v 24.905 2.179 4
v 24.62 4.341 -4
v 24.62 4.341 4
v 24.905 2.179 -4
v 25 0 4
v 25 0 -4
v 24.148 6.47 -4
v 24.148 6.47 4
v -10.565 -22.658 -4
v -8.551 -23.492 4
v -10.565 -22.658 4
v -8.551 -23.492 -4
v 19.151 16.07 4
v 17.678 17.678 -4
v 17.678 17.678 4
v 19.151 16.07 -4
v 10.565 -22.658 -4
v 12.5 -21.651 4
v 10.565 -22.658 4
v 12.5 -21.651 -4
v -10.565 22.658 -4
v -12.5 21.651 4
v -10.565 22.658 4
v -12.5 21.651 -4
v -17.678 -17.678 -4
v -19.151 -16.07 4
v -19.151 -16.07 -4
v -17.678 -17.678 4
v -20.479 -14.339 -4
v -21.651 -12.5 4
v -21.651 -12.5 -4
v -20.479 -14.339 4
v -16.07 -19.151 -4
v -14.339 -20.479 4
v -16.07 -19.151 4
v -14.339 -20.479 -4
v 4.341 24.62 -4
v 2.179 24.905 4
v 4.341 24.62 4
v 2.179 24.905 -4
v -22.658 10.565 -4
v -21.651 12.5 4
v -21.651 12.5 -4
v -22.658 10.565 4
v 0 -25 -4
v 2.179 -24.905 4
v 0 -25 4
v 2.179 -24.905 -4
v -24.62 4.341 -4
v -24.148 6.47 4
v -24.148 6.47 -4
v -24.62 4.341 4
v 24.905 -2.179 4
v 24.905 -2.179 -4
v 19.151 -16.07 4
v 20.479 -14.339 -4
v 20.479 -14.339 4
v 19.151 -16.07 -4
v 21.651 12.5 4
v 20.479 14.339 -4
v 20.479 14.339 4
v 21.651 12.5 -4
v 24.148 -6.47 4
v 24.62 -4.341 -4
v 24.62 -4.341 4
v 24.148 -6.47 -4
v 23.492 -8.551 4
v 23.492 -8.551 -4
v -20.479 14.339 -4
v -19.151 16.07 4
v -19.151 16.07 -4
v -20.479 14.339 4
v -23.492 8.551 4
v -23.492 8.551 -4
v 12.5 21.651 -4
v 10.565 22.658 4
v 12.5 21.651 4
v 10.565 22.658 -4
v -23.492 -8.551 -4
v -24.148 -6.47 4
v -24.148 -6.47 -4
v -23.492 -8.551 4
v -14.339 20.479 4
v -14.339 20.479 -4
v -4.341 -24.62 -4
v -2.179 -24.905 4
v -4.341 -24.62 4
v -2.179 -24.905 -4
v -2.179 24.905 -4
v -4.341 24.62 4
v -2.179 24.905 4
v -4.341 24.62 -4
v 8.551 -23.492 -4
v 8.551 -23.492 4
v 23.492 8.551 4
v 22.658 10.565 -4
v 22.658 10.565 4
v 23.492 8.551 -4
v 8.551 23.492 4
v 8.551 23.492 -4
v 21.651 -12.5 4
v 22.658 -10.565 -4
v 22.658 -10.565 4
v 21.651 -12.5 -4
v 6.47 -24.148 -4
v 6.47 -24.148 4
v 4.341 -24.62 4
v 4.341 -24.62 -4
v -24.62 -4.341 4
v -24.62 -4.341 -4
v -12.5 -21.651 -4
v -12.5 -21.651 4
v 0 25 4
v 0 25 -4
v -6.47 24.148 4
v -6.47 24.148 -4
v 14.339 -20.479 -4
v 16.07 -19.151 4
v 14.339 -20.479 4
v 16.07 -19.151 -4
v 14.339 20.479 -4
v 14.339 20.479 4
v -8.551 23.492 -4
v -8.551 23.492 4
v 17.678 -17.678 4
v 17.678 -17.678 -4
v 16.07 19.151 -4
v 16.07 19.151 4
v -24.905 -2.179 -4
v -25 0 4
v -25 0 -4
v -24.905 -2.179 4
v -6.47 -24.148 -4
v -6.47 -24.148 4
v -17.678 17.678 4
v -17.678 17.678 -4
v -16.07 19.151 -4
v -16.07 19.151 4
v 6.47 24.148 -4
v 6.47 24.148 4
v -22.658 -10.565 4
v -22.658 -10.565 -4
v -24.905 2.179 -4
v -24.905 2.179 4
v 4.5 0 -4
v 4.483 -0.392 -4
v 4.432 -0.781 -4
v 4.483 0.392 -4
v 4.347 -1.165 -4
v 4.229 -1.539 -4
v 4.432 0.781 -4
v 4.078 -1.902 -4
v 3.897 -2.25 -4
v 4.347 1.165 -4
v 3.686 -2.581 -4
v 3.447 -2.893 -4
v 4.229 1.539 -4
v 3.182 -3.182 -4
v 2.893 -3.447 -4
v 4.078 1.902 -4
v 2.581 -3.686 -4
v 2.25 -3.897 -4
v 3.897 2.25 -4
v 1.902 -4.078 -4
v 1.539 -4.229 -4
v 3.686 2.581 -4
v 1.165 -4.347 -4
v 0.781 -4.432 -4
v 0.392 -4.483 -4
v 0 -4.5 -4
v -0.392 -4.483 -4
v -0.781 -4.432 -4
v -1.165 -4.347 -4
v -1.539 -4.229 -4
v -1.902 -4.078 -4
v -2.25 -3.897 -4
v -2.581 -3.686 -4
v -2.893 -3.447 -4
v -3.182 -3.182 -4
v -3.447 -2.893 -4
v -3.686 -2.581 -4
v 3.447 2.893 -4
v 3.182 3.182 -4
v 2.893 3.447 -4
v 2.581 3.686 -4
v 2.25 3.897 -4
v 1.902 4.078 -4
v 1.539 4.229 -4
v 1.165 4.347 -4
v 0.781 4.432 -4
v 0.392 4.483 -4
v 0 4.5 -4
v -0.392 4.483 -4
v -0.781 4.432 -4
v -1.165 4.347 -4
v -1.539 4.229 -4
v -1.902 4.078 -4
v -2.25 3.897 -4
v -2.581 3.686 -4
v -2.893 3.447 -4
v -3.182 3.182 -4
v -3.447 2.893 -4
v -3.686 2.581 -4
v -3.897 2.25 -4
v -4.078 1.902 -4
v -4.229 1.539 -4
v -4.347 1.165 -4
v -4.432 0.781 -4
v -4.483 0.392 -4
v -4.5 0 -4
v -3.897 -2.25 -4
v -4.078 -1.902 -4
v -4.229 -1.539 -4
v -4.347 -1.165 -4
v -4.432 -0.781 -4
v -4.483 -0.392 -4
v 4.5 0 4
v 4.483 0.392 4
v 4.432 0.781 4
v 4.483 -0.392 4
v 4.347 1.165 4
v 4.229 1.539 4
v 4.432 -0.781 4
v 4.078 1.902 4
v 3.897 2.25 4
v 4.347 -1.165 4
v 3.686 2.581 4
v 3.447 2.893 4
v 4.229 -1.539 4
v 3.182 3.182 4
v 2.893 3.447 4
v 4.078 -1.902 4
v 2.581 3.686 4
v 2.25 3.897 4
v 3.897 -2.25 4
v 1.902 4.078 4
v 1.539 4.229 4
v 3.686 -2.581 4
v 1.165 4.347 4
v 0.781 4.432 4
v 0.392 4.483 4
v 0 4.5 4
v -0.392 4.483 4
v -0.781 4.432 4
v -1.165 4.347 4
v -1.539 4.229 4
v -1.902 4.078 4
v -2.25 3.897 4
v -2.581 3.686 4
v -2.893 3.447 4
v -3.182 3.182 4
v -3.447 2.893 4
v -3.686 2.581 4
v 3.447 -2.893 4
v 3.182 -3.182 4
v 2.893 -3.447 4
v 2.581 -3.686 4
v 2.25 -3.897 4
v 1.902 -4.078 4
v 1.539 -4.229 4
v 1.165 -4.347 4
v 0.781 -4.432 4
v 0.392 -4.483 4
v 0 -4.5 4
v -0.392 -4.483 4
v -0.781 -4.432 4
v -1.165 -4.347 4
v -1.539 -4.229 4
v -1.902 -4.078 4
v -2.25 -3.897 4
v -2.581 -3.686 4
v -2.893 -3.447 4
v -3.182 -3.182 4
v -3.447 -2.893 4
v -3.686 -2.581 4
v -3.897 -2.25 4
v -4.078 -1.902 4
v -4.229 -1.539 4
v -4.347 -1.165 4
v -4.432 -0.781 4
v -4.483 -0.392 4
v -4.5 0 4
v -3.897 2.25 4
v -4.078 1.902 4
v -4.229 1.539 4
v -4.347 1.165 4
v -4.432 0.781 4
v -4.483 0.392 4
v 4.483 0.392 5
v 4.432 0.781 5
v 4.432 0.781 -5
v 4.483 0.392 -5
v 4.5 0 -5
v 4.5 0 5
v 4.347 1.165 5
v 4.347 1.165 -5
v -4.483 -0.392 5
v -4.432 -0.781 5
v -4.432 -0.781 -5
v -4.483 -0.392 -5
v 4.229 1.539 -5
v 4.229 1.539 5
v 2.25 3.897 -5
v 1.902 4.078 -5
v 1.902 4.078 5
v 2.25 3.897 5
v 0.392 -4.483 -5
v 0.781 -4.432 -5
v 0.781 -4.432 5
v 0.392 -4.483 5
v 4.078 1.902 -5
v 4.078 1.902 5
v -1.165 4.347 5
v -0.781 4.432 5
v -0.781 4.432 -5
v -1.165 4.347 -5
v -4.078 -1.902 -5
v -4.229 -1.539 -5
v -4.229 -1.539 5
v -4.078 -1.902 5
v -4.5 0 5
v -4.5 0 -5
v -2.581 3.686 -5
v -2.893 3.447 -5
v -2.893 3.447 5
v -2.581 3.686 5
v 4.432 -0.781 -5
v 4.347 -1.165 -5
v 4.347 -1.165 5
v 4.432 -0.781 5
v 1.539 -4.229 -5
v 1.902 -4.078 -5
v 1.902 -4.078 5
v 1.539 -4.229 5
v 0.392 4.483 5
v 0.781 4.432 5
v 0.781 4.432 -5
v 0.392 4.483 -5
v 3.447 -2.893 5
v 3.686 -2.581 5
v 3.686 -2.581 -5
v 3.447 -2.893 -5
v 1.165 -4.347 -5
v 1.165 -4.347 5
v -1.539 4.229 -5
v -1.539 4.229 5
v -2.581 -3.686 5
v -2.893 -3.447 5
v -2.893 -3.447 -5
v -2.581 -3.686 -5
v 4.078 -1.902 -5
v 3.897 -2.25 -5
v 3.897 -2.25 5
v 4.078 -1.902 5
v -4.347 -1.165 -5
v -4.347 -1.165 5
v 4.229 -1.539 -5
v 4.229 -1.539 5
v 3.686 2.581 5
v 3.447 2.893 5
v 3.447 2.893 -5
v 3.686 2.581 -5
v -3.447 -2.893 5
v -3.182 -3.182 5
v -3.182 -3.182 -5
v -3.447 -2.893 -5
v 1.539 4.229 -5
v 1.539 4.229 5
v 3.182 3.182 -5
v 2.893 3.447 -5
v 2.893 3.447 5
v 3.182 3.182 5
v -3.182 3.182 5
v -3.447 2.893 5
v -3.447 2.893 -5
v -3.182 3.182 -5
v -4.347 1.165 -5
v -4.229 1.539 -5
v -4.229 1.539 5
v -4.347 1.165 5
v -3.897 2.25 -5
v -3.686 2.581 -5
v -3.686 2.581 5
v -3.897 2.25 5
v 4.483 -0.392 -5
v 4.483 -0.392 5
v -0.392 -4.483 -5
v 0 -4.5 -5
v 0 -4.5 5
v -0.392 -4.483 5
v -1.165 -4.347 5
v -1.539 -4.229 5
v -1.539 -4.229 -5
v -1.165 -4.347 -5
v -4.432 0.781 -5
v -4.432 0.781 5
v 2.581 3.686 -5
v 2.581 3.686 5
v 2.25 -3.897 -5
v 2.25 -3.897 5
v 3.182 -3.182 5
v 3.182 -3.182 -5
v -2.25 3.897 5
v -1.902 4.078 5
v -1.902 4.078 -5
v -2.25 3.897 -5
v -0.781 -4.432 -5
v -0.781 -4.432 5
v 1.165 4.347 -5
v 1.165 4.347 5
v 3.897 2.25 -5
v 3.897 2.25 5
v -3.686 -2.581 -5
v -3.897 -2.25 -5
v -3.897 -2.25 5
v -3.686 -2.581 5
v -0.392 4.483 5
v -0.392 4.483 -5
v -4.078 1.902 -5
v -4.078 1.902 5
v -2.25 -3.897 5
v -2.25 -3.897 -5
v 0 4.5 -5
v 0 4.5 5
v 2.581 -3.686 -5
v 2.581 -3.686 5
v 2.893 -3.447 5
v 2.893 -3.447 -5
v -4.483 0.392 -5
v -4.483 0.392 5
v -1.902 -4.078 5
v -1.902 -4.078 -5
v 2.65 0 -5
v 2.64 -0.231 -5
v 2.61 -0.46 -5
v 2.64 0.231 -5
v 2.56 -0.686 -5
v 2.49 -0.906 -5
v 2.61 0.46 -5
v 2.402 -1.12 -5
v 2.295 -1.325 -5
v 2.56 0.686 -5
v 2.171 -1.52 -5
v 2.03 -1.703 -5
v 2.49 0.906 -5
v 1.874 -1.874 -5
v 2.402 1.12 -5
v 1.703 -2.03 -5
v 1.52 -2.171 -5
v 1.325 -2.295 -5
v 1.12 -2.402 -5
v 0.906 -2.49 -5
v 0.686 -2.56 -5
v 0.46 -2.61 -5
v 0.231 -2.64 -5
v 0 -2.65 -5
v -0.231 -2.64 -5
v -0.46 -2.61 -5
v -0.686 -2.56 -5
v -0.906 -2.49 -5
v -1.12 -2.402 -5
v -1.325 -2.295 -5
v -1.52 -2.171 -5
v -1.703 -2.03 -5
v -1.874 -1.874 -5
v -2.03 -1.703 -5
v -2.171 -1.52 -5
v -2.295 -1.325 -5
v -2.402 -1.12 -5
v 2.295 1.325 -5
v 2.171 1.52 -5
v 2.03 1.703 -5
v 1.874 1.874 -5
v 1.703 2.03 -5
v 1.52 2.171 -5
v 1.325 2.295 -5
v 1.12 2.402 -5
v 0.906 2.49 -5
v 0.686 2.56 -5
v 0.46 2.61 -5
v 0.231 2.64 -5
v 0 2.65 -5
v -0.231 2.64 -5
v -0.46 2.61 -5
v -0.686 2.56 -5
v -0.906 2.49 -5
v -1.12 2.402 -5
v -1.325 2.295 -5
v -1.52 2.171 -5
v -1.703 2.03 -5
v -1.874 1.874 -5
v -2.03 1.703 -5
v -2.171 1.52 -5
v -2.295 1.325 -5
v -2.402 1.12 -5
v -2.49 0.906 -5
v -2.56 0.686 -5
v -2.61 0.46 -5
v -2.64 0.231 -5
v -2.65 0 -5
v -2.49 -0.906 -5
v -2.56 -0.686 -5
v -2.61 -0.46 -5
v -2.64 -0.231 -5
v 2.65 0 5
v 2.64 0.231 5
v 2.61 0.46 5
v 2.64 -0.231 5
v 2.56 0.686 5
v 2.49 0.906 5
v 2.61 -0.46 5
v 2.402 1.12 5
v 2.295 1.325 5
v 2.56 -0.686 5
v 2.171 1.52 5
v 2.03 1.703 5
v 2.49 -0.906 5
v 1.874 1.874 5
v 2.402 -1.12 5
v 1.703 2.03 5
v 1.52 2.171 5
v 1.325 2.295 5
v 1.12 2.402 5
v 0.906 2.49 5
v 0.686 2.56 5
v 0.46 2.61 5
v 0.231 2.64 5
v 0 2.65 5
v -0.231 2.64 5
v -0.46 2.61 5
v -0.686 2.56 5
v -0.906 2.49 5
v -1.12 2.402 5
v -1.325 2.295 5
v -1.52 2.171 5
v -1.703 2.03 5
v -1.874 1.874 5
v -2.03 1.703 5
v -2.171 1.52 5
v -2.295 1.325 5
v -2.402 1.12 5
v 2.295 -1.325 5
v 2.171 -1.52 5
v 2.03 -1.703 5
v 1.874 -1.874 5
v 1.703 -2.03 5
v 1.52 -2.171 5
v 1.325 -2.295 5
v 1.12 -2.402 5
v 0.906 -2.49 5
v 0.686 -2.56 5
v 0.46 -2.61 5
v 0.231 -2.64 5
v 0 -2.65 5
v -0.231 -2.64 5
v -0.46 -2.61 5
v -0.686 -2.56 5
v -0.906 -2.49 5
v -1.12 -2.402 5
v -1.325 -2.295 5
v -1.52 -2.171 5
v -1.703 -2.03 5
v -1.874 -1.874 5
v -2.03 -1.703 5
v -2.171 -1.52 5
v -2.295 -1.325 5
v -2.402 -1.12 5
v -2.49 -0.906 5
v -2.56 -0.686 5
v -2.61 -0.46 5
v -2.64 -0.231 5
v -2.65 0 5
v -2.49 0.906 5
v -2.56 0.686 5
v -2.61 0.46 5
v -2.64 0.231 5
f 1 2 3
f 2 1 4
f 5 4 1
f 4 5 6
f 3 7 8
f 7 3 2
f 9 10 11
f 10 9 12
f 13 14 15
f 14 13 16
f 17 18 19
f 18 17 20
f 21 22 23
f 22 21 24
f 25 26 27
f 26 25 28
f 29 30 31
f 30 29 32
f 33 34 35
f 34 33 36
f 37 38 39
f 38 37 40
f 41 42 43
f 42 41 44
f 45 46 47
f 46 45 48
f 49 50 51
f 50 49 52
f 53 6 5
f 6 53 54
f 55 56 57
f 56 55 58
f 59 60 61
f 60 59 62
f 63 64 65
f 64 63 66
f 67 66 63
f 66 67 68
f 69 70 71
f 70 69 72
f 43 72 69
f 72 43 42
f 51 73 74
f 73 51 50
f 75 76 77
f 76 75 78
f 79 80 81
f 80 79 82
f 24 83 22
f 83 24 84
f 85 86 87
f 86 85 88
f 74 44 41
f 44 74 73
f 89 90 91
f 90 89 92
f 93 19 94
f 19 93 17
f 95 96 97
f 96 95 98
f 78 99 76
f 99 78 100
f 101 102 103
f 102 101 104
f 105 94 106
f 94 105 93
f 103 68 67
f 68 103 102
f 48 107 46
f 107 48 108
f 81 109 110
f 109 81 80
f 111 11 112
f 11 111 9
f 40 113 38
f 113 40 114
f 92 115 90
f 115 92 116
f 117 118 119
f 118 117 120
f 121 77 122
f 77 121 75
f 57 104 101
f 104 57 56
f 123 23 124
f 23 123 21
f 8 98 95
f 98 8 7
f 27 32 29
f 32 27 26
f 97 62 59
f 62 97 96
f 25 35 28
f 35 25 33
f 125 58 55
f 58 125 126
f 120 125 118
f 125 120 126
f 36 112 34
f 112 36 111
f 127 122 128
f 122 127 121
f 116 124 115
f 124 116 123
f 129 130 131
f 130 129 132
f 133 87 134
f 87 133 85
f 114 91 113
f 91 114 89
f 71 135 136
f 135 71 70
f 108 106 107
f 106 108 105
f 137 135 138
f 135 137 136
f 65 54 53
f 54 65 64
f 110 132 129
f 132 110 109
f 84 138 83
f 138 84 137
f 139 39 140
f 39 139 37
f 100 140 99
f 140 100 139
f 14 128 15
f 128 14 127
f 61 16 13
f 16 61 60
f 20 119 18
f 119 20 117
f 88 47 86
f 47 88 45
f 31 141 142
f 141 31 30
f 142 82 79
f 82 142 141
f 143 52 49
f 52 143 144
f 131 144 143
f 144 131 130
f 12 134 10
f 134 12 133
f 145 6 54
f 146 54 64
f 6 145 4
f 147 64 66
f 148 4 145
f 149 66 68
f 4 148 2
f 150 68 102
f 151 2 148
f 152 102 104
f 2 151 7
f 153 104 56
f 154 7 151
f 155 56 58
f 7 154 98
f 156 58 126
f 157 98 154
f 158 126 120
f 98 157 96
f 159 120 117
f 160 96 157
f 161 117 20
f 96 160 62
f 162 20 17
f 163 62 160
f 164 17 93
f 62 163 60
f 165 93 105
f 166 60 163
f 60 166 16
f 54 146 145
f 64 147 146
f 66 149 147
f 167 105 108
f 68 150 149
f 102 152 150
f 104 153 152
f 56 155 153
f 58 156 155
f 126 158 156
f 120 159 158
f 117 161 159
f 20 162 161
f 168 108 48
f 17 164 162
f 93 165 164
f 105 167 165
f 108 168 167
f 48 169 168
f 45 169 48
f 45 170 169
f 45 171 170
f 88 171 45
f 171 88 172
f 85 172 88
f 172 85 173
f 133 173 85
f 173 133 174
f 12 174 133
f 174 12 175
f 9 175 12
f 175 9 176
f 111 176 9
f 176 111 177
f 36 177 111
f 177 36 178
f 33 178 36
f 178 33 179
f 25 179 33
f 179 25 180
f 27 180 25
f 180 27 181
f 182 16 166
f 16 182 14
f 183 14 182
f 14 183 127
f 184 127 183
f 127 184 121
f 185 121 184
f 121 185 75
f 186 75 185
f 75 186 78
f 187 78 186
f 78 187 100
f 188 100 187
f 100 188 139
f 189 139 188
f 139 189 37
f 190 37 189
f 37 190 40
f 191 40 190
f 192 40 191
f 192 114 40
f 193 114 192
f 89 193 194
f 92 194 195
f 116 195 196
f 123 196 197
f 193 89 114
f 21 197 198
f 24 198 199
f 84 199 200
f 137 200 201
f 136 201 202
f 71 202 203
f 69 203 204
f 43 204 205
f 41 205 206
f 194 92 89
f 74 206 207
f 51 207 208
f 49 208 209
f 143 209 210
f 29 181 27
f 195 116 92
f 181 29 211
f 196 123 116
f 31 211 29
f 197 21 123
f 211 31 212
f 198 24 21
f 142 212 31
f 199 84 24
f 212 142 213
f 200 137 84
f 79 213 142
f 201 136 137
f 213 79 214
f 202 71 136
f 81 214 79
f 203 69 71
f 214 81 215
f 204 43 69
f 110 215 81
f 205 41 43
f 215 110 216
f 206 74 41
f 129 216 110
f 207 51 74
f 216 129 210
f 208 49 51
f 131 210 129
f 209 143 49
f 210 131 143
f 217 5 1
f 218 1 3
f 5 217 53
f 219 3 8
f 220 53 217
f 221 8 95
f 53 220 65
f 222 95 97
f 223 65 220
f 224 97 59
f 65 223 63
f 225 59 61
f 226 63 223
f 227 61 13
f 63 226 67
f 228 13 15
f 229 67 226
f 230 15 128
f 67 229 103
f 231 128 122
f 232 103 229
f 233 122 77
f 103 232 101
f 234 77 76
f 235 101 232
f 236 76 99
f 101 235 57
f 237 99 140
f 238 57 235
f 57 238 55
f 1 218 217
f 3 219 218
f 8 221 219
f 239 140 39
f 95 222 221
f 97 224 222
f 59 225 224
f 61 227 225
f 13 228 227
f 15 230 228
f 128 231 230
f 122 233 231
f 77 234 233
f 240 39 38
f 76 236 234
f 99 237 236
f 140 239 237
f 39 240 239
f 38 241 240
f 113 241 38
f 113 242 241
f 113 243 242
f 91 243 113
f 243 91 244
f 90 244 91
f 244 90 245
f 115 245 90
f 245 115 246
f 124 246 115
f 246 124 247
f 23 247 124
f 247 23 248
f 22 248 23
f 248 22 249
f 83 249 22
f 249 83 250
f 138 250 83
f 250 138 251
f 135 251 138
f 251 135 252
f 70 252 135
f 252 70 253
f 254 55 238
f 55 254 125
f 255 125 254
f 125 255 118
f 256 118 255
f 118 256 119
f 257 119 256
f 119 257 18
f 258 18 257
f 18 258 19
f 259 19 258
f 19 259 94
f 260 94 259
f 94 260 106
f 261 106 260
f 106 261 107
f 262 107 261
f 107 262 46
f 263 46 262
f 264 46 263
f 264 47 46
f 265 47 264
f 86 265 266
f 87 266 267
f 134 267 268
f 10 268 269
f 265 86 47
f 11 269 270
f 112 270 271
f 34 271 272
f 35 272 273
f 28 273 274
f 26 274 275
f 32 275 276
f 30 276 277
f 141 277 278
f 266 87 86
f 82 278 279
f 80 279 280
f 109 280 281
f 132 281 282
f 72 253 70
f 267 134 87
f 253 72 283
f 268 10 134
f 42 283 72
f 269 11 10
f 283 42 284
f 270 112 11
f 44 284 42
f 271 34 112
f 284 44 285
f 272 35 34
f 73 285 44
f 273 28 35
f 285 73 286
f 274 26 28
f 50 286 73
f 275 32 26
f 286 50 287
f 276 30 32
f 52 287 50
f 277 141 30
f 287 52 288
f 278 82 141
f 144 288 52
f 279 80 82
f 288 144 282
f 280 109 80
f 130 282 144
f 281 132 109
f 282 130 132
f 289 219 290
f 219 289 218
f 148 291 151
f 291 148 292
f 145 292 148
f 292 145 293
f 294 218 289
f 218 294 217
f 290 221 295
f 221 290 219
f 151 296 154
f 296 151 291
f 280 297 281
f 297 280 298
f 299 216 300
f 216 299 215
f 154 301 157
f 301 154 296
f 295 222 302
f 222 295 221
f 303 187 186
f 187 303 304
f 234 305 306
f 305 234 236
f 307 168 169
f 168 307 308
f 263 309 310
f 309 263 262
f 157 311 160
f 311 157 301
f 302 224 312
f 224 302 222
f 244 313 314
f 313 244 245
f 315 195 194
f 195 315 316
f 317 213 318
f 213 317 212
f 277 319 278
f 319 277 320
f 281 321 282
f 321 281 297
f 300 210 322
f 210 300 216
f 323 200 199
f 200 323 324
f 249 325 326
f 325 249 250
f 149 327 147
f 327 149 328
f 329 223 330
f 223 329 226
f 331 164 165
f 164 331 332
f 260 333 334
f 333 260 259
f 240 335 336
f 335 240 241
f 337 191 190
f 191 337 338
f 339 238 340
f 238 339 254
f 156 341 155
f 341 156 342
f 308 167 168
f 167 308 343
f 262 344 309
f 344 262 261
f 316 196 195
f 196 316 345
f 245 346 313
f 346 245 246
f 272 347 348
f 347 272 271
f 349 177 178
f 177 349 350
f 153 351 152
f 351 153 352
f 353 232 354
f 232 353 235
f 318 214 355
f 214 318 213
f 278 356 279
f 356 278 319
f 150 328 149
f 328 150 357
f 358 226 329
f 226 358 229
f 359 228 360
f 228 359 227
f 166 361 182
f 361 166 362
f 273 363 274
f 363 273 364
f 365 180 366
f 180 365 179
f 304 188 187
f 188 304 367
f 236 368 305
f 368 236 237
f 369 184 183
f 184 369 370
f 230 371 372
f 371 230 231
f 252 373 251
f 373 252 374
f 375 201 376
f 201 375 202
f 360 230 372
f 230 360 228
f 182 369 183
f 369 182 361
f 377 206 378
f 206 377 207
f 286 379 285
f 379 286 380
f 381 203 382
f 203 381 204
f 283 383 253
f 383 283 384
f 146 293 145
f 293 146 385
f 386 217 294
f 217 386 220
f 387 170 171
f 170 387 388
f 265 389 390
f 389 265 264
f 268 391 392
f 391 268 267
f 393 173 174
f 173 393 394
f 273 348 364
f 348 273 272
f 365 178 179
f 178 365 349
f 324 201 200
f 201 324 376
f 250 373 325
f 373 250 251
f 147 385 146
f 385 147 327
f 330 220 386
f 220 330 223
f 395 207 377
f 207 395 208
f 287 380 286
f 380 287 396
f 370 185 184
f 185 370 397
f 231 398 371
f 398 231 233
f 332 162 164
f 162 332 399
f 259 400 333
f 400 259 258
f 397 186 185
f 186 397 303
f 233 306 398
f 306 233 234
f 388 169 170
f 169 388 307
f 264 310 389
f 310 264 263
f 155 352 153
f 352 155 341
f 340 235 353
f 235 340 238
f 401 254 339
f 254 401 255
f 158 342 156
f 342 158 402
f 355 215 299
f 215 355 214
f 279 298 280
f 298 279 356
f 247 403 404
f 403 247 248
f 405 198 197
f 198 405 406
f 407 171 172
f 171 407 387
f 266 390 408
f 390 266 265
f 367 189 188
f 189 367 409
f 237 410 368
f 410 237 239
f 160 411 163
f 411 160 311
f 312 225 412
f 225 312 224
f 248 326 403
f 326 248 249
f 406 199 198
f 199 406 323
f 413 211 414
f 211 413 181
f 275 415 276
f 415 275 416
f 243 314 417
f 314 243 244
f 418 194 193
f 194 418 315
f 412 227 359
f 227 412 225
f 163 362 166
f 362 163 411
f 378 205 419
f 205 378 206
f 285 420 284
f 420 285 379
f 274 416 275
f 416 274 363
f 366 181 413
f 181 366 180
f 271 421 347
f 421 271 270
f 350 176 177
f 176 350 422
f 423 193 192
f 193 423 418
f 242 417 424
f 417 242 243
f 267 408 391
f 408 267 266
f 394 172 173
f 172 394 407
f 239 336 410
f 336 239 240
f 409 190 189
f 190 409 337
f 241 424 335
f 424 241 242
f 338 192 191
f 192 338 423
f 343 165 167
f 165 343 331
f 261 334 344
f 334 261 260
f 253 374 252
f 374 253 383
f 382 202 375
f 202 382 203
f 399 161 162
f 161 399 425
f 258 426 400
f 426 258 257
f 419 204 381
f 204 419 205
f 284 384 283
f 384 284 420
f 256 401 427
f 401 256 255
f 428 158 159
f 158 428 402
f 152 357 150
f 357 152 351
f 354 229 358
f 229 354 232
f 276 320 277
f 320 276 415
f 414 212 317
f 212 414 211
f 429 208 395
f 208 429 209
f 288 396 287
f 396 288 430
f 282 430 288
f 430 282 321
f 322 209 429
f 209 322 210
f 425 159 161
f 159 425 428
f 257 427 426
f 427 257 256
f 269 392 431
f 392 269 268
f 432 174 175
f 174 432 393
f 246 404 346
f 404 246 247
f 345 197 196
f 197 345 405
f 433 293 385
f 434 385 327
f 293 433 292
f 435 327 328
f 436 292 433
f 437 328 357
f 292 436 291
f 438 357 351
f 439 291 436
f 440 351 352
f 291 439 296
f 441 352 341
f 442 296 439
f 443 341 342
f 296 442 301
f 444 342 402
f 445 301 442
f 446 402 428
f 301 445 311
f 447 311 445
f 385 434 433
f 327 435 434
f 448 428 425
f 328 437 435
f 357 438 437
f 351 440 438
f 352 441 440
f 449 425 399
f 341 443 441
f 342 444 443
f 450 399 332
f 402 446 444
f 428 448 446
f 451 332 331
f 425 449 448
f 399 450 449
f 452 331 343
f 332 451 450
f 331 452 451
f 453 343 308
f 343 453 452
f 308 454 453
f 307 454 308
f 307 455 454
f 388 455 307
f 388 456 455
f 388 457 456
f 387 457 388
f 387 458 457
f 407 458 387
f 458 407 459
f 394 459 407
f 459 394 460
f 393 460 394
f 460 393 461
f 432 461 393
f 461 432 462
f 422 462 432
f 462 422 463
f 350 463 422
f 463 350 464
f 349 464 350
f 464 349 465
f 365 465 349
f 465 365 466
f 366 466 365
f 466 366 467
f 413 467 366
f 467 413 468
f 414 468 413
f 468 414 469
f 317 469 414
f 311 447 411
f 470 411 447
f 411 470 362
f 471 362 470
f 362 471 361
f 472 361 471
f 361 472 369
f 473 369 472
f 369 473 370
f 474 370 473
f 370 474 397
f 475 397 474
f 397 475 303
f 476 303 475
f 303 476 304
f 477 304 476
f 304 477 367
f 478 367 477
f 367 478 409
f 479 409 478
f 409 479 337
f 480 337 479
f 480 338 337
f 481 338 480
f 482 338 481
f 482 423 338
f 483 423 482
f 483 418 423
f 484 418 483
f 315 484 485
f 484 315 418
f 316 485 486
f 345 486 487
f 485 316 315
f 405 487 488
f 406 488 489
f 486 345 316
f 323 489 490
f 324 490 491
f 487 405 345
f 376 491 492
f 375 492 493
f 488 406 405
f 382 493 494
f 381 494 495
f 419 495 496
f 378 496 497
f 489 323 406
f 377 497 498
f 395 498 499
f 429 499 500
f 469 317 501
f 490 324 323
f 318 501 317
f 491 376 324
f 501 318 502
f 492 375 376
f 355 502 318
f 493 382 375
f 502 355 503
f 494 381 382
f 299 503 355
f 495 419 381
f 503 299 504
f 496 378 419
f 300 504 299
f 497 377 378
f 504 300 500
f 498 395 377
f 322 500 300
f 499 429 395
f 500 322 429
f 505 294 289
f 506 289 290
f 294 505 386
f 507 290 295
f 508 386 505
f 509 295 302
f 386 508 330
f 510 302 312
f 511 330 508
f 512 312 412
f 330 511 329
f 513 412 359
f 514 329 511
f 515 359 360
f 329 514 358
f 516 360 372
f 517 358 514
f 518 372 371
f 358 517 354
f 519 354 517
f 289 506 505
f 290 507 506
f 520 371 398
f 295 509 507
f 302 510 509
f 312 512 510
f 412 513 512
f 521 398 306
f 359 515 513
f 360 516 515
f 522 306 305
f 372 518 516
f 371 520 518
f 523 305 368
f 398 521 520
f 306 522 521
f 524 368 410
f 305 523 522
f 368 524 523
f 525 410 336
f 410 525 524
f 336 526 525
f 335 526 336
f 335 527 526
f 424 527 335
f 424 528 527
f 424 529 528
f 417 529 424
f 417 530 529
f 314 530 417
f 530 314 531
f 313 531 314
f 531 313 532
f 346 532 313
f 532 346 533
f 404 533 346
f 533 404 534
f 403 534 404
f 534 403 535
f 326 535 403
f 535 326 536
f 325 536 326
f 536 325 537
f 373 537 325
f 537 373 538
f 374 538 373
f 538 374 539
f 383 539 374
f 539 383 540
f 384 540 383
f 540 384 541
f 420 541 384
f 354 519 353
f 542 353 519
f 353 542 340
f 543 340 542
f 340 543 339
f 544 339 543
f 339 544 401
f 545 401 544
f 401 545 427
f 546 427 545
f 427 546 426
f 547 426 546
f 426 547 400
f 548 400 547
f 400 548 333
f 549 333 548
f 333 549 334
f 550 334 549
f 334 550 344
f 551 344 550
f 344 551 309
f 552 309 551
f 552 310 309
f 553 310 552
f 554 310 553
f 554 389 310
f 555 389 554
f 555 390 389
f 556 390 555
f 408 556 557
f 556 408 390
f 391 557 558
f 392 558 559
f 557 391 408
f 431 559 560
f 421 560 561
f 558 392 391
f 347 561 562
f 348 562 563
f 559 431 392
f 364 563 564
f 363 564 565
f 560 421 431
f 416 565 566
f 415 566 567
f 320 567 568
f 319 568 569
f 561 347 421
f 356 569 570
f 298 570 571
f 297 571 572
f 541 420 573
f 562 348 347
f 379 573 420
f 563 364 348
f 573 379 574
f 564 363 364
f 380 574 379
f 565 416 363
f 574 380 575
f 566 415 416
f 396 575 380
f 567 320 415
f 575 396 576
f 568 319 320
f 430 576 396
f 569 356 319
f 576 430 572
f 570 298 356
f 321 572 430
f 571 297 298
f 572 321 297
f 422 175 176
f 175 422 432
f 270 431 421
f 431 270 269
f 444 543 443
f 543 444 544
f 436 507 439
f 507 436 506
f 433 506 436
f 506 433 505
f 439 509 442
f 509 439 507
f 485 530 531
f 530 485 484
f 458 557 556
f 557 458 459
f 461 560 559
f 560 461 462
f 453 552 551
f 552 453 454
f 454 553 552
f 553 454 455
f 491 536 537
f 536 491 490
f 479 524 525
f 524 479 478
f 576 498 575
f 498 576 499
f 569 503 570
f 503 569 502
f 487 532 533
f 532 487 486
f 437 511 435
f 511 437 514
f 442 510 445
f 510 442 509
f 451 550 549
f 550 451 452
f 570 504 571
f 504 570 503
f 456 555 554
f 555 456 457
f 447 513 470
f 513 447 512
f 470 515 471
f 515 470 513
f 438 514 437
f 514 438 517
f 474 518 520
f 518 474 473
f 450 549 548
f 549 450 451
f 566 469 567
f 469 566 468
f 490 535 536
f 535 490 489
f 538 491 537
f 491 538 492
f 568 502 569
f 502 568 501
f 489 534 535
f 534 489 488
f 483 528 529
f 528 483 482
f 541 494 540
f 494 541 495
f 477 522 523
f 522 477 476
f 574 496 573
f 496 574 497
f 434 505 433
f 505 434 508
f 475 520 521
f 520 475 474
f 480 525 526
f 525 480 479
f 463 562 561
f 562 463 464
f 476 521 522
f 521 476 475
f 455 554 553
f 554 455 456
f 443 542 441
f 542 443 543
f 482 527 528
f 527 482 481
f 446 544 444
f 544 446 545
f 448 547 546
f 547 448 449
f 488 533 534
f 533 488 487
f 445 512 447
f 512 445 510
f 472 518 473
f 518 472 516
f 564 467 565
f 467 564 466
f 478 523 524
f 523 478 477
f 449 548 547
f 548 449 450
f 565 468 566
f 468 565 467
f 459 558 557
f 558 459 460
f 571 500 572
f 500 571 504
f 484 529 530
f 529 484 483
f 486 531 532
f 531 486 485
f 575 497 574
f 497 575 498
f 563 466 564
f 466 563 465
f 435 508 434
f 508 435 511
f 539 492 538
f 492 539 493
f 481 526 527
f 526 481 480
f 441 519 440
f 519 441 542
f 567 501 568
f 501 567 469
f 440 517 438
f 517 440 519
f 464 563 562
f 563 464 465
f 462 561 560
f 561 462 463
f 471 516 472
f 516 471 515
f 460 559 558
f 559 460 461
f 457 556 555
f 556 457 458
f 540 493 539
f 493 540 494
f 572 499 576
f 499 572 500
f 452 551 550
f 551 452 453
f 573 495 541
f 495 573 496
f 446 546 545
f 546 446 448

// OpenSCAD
$fn = 72;

wheel_r = 25;      // medium wheel radius ~50 mm diameter
thickness = 8;
hub_r = 4.5;
axle_hole_r = 2.65;

difference() {
  union() {
    // tire
    cylinder(h=thickness, r=wheel_r, center=true);
    // hub
    cylinder(h=thickness+2, r=hub_r, center=true);
  }
  // axle hole
  cylinder(h=thickness+4, r=axle_hole_r, center=true);
}
